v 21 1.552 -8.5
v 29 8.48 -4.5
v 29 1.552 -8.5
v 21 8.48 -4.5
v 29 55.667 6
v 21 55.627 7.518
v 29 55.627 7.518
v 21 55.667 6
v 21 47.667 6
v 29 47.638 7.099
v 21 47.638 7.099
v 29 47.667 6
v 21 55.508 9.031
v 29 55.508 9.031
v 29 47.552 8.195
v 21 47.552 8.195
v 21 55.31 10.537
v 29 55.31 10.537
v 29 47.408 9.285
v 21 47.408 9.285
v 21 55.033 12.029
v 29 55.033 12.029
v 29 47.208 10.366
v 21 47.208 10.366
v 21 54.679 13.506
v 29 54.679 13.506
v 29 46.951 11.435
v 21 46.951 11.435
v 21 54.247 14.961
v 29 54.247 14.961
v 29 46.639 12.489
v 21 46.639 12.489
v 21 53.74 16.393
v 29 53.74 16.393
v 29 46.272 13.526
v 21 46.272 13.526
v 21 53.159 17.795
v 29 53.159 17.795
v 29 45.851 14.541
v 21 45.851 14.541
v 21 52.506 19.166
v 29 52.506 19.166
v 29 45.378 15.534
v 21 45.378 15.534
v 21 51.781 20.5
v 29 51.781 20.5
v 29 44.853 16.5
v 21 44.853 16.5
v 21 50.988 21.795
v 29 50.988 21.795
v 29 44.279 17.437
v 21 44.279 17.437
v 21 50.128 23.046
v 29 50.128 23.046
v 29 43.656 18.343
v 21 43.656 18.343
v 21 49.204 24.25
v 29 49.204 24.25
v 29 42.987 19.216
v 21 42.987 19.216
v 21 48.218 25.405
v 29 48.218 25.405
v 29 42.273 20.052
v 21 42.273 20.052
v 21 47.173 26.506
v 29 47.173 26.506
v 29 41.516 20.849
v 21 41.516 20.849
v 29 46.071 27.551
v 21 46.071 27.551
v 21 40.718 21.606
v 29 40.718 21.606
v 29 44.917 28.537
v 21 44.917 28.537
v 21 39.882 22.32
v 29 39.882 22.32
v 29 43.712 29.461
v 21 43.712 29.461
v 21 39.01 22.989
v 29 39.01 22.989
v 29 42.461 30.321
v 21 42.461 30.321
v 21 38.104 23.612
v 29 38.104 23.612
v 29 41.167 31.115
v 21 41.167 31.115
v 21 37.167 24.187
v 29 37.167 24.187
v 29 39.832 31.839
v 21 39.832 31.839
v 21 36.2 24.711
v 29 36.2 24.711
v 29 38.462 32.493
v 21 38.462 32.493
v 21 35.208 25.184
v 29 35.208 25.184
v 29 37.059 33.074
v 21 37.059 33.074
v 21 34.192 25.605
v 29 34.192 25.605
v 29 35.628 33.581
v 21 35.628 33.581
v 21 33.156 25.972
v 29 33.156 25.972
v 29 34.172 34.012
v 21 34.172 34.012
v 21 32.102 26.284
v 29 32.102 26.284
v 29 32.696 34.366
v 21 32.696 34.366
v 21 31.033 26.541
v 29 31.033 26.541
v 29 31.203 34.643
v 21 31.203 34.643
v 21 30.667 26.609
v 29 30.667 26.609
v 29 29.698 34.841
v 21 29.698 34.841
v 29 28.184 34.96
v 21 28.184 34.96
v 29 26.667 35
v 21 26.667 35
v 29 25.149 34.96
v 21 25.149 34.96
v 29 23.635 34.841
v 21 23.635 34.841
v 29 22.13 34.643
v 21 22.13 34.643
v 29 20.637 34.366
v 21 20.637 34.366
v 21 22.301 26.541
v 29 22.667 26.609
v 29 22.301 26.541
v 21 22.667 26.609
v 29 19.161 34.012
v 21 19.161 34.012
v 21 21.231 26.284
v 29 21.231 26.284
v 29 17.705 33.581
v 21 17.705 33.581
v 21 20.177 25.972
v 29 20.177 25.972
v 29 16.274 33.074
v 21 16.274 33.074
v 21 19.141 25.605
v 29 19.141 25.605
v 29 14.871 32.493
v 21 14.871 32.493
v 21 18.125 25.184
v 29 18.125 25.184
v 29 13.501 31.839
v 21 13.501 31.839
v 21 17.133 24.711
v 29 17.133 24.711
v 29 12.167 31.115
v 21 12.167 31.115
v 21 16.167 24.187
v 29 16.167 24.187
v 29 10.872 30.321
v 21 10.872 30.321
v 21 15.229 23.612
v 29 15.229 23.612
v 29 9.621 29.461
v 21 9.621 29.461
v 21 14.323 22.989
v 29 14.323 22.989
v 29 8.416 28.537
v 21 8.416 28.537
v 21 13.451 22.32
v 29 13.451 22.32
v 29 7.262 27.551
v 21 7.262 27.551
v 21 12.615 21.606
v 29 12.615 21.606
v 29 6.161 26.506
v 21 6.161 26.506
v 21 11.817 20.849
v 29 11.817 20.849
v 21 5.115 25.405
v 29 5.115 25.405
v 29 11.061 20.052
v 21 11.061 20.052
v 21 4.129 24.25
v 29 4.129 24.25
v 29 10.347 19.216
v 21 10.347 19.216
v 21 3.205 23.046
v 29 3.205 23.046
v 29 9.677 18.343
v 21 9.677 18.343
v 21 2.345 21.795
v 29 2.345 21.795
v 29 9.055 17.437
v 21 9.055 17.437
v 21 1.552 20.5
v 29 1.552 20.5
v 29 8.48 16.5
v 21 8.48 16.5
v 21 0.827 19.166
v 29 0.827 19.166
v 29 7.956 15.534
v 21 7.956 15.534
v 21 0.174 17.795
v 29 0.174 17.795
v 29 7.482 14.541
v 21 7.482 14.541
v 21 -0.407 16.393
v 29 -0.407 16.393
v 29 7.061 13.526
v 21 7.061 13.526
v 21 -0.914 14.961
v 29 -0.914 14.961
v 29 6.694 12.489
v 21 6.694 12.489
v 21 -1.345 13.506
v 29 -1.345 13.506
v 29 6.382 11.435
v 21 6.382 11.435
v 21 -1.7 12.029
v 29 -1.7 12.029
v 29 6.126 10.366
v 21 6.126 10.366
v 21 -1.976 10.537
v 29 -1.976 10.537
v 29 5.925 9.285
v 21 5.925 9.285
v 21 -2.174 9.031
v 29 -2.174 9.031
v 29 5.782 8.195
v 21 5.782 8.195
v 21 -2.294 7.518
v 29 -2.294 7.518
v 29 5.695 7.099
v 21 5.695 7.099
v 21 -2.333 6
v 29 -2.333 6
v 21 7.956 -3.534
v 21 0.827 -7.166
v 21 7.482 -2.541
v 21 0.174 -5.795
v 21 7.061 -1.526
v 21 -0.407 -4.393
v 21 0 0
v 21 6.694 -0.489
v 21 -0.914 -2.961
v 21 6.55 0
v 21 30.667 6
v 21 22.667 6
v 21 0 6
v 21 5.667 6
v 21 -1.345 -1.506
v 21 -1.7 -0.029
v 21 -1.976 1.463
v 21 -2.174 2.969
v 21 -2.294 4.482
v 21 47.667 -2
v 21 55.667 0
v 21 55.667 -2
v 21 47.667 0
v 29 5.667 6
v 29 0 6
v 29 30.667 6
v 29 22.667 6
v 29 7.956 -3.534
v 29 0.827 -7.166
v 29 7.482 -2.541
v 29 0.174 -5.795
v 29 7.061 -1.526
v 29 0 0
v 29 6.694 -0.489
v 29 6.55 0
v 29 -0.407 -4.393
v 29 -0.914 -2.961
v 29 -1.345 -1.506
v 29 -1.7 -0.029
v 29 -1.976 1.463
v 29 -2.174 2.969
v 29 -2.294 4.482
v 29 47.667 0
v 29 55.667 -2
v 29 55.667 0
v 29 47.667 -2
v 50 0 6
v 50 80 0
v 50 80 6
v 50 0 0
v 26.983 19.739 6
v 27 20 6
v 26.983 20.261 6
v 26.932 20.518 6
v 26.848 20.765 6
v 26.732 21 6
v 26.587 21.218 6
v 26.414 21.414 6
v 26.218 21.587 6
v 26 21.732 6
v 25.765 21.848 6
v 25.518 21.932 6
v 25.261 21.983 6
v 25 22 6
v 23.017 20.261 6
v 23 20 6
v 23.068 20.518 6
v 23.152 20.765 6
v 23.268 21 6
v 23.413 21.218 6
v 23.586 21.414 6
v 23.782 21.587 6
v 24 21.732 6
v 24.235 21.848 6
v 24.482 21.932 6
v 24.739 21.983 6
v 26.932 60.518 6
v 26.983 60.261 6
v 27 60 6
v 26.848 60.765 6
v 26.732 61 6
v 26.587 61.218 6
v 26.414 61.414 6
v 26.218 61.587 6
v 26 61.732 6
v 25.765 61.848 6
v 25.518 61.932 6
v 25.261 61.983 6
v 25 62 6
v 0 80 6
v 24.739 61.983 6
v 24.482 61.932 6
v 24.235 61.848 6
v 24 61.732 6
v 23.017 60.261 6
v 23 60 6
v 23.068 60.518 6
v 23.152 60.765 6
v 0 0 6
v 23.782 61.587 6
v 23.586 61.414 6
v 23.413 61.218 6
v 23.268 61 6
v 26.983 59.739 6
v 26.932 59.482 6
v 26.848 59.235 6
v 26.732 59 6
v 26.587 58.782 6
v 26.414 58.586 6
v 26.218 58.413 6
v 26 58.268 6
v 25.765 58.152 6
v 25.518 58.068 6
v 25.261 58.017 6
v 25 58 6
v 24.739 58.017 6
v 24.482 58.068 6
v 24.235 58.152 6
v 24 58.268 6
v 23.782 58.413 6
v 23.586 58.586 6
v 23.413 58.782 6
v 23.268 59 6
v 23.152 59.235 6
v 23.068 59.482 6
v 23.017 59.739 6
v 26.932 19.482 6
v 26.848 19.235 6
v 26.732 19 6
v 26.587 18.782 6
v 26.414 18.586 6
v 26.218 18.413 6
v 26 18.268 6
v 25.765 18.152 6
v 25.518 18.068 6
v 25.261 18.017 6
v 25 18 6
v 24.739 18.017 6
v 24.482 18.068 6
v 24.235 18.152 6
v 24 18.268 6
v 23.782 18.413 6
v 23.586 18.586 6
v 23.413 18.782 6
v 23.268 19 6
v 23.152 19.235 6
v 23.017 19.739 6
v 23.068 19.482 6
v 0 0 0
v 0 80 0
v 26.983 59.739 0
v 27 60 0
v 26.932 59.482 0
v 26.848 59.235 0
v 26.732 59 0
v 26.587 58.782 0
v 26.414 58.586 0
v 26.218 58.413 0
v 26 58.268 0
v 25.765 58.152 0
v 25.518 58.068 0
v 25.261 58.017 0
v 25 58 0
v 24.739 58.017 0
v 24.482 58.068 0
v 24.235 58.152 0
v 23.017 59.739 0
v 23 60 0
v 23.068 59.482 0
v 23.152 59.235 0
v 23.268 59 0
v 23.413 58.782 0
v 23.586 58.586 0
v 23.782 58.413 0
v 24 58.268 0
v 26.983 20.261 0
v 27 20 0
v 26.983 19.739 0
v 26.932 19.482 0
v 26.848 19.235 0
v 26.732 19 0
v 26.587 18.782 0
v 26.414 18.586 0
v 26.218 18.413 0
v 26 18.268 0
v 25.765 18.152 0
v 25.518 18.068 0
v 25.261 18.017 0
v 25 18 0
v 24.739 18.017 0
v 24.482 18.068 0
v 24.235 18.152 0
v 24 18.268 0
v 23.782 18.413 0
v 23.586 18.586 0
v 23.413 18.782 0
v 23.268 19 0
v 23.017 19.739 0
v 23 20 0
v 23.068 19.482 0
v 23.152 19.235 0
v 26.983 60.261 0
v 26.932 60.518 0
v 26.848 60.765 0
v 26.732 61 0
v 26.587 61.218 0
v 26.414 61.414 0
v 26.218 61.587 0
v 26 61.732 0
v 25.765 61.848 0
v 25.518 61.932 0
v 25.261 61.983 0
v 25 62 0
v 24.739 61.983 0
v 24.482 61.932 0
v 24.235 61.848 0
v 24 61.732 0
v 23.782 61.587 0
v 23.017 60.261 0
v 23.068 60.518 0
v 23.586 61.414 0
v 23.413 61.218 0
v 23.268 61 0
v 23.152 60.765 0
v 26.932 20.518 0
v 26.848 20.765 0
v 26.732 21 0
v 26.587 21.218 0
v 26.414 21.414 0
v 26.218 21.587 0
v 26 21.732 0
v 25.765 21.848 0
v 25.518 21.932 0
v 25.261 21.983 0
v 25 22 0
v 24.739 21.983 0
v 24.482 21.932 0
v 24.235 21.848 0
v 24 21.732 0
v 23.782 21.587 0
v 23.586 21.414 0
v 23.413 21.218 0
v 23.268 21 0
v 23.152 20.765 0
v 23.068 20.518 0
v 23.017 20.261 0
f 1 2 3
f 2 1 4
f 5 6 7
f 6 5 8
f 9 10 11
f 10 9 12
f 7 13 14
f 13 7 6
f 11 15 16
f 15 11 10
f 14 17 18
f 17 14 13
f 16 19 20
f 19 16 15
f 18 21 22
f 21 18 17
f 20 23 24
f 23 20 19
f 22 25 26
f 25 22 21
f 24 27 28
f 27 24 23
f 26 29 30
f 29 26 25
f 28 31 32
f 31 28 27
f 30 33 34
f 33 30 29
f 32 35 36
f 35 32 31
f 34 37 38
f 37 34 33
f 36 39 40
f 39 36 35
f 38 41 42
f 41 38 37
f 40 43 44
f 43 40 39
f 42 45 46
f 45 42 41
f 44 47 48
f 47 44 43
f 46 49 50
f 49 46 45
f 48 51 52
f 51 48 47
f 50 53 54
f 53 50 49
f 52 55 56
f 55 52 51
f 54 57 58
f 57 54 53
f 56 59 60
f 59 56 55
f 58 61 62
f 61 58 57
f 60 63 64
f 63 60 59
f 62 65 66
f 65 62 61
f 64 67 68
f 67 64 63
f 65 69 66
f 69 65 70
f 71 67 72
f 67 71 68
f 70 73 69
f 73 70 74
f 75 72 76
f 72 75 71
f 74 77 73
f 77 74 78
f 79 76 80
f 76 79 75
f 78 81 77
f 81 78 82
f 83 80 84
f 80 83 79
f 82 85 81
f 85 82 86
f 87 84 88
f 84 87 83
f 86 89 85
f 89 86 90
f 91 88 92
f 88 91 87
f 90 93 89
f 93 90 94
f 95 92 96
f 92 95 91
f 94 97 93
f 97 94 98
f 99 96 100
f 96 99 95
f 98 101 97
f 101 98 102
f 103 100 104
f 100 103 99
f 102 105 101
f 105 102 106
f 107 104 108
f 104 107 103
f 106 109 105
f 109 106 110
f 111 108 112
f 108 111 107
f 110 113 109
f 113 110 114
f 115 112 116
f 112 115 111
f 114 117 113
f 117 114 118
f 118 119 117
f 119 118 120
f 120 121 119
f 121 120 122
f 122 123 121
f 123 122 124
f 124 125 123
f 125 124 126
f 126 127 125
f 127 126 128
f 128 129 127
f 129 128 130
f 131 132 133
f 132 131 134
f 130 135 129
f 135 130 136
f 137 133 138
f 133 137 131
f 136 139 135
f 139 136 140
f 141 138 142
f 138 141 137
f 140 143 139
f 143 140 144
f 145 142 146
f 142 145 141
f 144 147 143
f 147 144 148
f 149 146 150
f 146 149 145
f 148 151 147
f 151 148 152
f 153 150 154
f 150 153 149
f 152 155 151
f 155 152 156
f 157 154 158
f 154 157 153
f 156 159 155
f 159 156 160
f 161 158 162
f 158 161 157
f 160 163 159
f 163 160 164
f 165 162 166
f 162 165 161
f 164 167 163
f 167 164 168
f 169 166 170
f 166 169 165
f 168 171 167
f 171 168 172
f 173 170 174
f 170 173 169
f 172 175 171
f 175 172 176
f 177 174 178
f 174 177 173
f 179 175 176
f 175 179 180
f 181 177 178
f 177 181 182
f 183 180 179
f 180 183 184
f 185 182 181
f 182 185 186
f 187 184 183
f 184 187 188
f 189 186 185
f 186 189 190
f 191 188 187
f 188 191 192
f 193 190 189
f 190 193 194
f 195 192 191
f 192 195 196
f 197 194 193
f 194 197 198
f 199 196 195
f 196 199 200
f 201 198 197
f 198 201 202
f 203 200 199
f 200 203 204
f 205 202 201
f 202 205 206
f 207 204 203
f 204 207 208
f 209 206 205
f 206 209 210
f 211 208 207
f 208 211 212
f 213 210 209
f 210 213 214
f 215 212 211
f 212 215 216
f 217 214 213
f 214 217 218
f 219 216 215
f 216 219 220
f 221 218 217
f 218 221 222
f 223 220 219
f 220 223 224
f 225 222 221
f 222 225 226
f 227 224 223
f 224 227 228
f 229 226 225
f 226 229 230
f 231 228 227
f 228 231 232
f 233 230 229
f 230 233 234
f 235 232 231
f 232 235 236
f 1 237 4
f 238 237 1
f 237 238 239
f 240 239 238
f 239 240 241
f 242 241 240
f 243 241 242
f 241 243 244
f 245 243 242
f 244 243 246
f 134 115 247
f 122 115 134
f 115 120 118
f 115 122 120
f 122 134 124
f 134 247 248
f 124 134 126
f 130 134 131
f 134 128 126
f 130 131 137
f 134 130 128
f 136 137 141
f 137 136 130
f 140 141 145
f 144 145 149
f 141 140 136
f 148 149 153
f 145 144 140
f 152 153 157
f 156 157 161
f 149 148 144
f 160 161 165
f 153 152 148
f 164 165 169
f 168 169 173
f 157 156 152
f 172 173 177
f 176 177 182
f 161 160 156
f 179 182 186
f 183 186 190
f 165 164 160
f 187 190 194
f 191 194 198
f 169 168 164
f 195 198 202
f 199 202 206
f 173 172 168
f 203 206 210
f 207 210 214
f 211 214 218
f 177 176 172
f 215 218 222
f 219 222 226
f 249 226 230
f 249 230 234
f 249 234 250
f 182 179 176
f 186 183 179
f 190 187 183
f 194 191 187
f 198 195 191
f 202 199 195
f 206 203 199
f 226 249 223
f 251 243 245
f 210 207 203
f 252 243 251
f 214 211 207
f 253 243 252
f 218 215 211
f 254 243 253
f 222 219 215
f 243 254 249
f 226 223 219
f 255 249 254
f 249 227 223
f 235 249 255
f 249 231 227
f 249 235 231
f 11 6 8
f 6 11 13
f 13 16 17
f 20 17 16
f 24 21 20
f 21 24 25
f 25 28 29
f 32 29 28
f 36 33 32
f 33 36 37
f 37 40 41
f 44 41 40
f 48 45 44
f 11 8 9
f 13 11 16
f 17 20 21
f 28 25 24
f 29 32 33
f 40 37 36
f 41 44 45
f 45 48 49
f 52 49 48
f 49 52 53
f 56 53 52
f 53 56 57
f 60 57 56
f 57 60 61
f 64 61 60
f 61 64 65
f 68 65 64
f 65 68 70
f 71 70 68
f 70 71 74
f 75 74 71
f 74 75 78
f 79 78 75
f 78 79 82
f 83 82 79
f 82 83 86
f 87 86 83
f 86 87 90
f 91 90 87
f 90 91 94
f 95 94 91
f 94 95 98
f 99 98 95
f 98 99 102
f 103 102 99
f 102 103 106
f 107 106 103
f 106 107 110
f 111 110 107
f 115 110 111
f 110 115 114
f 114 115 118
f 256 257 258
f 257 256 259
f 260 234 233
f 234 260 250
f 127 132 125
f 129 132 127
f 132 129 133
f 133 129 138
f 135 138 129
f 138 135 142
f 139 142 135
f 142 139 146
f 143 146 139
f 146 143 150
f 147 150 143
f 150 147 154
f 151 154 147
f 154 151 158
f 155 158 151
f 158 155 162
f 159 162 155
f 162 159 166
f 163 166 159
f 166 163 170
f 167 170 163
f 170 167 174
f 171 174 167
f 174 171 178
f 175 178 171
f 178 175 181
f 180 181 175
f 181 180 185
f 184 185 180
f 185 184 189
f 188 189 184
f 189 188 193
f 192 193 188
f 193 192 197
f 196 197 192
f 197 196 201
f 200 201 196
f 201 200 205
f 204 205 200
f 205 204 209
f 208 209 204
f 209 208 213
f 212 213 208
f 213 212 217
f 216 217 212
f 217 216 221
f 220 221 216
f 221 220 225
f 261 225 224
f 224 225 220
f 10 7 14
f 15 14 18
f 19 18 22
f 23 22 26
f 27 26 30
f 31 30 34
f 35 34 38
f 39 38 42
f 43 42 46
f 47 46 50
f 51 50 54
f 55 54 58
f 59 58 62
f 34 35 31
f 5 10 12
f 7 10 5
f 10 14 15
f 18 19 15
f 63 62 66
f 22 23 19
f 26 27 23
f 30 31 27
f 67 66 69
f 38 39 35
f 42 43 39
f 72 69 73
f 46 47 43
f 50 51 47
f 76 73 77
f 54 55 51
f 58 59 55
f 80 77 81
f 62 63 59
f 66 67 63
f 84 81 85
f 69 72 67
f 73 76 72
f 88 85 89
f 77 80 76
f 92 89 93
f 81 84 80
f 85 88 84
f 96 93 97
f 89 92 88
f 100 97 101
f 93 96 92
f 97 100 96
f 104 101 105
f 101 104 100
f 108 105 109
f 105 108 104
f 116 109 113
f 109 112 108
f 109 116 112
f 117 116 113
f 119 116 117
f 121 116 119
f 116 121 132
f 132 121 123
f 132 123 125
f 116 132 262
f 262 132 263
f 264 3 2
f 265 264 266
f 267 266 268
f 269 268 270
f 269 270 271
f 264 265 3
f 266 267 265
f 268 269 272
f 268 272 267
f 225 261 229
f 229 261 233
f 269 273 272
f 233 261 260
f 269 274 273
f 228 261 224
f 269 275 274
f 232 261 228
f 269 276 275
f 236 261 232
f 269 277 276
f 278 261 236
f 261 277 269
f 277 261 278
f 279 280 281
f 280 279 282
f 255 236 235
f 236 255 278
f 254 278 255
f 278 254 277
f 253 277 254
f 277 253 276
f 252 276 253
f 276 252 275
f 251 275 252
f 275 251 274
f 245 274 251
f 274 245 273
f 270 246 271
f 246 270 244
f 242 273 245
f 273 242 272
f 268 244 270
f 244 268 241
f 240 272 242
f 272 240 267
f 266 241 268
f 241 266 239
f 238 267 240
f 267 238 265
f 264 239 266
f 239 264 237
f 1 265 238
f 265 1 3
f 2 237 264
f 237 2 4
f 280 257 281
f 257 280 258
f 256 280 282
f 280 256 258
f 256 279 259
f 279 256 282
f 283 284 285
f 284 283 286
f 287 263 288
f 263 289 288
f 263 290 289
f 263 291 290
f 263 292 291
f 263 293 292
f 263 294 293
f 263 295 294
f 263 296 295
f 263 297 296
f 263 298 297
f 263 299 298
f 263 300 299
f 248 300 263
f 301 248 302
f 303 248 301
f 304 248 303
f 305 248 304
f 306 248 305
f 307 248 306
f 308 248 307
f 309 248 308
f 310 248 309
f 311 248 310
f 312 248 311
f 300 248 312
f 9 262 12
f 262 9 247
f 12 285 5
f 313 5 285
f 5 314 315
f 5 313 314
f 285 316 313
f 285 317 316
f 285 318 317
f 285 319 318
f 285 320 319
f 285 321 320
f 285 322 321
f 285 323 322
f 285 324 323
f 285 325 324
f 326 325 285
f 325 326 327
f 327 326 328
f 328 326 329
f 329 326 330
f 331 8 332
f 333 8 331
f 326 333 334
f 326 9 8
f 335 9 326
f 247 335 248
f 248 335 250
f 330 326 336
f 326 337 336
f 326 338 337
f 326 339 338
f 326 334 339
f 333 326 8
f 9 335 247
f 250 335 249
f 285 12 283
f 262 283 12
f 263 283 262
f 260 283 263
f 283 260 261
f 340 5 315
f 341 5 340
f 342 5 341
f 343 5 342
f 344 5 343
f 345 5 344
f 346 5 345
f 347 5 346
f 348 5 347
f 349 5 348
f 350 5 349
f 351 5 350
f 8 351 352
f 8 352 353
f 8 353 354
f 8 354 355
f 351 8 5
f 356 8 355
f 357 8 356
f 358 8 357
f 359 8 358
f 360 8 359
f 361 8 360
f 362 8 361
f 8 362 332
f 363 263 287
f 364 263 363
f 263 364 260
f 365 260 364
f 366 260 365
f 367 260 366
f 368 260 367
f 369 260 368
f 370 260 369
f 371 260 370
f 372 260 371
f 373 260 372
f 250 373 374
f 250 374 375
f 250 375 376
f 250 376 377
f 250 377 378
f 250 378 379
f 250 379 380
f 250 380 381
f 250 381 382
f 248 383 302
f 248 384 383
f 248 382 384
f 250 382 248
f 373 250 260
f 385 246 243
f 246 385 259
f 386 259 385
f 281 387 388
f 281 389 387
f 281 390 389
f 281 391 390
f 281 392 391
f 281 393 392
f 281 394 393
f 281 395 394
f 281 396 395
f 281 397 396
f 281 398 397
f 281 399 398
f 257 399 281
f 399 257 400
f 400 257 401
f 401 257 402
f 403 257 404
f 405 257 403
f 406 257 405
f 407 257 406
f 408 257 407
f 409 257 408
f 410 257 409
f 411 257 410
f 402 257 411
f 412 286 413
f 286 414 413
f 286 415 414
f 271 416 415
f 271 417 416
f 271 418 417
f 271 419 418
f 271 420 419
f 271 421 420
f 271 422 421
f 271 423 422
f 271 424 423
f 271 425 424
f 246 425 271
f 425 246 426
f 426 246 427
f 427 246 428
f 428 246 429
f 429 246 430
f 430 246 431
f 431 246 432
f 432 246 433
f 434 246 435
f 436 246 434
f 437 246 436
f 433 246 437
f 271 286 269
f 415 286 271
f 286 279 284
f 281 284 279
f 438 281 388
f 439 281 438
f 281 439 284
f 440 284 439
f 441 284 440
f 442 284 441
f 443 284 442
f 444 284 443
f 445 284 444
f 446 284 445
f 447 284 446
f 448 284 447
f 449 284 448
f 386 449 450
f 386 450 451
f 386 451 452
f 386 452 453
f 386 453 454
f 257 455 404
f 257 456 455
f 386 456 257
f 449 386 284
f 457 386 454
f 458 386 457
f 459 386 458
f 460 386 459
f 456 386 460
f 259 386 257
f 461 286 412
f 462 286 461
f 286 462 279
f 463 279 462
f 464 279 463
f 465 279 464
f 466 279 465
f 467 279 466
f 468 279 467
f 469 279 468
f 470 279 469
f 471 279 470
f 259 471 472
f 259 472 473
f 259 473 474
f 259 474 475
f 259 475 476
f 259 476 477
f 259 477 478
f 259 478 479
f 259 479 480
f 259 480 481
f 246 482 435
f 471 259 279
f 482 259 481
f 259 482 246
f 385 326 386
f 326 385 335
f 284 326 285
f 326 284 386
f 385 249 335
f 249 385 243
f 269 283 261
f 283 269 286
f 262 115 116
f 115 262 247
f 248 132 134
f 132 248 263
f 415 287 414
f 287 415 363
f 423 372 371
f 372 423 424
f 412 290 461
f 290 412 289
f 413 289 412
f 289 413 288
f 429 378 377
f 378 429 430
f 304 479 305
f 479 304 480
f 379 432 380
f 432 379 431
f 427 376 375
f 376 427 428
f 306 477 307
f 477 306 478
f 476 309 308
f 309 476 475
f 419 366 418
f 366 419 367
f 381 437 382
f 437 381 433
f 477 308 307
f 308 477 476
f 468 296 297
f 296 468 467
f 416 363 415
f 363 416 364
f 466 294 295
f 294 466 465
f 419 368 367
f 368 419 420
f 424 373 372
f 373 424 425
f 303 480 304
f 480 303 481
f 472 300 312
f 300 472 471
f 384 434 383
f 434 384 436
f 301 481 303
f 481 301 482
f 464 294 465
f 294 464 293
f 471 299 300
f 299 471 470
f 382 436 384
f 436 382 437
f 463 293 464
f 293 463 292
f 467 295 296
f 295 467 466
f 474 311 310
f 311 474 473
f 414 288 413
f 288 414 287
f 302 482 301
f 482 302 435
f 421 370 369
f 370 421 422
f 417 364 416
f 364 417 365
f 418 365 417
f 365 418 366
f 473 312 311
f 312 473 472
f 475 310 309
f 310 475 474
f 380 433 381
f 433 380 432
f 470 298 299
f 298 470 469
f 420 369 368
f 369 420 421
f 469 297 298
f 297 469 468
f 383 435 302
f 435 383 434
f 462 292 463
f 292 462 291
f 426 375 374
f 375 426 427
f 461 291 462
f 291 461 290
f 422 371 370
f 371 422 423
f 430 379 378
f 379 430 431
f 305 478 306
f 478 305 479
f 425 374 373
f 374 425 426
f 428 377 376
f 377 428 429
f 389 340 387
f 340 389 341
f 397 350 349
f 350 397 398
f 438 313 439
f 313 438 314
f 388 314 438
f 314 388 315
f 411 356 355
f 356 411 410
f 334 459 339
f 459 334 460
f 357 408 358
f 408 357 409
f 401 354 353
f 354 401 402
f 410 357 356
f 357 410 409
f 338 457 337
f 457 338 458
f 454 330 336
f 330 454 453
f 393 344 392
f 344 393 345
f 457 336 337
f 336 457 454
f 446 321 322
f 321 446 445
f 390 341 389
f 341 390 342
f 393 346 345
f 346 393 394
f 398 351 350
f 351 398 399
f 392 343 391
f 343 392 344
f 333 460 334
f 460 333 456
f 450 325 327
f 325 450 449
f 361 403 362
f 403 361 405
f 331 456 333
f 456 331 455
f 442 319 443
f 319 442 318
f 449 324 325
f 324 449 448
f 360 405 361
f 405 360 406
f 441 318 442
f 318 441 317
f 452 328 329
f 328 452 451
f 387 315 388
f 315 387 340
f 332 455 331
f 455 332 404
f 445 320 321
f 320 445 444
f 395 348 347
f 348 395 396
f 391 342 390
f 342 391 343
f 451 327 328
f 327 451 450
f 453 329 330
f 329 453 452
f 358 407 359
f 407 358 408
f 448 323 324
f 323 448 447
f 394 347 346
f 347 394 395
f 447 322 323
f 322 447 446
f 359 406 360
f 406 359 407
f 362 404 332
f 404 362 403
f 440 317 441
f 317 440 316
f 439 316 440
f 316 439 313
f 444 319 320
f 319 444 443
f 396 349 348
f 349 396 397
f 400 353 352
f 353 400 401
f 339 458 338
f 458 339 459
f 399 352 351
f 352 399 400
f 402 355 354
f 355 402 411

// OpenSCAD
base_width = 50;
base_height = 80;
base_thickness = 6;
hook_radius = 25;
hook_thickness = 8;
screw_hole_diameter = 4;

module hook_arm() {
    union() {
        translate([0, 0, 0])
            rotate([90, 0, 0])
                rotate_extrude(angle = 210, $fn = 120)
                    translate([hook_radius, 0, 0])
                        square([hook_thickness, hook_thickness], center = true);
        translate([hook_radius, 0, -hook_thickness / 2])
            cube([hook_thickness, hook_thickness, hook_thickness], center = true);
    }
}

module main() {
    difference() {
        union() {
            cube([base_width, base_height, base_thickness], center = false);
            translate([base_width / 2, base_height / 3, base_thickness])
                rotate([0, 0, 90])
                    hook_arm();
            translate([
                base_width / 2 - hook_thickness / 2,
                base_height / 3 - hook_thickness / 2,
                base_thickness
            ])
                cube([
                    hook_thickness,
                    hook_thickness,
                    hook_radius
                ], center = false);
        }
        for (y_pos = [base_height * 0.25, base_height * 0.75])
            translate([base_width / 2, y_pos, -1])
                cylinder(d = screw_hole_diameter, h = base_thickness + 2, center = false, $fn = 48);
    }
}

main();
